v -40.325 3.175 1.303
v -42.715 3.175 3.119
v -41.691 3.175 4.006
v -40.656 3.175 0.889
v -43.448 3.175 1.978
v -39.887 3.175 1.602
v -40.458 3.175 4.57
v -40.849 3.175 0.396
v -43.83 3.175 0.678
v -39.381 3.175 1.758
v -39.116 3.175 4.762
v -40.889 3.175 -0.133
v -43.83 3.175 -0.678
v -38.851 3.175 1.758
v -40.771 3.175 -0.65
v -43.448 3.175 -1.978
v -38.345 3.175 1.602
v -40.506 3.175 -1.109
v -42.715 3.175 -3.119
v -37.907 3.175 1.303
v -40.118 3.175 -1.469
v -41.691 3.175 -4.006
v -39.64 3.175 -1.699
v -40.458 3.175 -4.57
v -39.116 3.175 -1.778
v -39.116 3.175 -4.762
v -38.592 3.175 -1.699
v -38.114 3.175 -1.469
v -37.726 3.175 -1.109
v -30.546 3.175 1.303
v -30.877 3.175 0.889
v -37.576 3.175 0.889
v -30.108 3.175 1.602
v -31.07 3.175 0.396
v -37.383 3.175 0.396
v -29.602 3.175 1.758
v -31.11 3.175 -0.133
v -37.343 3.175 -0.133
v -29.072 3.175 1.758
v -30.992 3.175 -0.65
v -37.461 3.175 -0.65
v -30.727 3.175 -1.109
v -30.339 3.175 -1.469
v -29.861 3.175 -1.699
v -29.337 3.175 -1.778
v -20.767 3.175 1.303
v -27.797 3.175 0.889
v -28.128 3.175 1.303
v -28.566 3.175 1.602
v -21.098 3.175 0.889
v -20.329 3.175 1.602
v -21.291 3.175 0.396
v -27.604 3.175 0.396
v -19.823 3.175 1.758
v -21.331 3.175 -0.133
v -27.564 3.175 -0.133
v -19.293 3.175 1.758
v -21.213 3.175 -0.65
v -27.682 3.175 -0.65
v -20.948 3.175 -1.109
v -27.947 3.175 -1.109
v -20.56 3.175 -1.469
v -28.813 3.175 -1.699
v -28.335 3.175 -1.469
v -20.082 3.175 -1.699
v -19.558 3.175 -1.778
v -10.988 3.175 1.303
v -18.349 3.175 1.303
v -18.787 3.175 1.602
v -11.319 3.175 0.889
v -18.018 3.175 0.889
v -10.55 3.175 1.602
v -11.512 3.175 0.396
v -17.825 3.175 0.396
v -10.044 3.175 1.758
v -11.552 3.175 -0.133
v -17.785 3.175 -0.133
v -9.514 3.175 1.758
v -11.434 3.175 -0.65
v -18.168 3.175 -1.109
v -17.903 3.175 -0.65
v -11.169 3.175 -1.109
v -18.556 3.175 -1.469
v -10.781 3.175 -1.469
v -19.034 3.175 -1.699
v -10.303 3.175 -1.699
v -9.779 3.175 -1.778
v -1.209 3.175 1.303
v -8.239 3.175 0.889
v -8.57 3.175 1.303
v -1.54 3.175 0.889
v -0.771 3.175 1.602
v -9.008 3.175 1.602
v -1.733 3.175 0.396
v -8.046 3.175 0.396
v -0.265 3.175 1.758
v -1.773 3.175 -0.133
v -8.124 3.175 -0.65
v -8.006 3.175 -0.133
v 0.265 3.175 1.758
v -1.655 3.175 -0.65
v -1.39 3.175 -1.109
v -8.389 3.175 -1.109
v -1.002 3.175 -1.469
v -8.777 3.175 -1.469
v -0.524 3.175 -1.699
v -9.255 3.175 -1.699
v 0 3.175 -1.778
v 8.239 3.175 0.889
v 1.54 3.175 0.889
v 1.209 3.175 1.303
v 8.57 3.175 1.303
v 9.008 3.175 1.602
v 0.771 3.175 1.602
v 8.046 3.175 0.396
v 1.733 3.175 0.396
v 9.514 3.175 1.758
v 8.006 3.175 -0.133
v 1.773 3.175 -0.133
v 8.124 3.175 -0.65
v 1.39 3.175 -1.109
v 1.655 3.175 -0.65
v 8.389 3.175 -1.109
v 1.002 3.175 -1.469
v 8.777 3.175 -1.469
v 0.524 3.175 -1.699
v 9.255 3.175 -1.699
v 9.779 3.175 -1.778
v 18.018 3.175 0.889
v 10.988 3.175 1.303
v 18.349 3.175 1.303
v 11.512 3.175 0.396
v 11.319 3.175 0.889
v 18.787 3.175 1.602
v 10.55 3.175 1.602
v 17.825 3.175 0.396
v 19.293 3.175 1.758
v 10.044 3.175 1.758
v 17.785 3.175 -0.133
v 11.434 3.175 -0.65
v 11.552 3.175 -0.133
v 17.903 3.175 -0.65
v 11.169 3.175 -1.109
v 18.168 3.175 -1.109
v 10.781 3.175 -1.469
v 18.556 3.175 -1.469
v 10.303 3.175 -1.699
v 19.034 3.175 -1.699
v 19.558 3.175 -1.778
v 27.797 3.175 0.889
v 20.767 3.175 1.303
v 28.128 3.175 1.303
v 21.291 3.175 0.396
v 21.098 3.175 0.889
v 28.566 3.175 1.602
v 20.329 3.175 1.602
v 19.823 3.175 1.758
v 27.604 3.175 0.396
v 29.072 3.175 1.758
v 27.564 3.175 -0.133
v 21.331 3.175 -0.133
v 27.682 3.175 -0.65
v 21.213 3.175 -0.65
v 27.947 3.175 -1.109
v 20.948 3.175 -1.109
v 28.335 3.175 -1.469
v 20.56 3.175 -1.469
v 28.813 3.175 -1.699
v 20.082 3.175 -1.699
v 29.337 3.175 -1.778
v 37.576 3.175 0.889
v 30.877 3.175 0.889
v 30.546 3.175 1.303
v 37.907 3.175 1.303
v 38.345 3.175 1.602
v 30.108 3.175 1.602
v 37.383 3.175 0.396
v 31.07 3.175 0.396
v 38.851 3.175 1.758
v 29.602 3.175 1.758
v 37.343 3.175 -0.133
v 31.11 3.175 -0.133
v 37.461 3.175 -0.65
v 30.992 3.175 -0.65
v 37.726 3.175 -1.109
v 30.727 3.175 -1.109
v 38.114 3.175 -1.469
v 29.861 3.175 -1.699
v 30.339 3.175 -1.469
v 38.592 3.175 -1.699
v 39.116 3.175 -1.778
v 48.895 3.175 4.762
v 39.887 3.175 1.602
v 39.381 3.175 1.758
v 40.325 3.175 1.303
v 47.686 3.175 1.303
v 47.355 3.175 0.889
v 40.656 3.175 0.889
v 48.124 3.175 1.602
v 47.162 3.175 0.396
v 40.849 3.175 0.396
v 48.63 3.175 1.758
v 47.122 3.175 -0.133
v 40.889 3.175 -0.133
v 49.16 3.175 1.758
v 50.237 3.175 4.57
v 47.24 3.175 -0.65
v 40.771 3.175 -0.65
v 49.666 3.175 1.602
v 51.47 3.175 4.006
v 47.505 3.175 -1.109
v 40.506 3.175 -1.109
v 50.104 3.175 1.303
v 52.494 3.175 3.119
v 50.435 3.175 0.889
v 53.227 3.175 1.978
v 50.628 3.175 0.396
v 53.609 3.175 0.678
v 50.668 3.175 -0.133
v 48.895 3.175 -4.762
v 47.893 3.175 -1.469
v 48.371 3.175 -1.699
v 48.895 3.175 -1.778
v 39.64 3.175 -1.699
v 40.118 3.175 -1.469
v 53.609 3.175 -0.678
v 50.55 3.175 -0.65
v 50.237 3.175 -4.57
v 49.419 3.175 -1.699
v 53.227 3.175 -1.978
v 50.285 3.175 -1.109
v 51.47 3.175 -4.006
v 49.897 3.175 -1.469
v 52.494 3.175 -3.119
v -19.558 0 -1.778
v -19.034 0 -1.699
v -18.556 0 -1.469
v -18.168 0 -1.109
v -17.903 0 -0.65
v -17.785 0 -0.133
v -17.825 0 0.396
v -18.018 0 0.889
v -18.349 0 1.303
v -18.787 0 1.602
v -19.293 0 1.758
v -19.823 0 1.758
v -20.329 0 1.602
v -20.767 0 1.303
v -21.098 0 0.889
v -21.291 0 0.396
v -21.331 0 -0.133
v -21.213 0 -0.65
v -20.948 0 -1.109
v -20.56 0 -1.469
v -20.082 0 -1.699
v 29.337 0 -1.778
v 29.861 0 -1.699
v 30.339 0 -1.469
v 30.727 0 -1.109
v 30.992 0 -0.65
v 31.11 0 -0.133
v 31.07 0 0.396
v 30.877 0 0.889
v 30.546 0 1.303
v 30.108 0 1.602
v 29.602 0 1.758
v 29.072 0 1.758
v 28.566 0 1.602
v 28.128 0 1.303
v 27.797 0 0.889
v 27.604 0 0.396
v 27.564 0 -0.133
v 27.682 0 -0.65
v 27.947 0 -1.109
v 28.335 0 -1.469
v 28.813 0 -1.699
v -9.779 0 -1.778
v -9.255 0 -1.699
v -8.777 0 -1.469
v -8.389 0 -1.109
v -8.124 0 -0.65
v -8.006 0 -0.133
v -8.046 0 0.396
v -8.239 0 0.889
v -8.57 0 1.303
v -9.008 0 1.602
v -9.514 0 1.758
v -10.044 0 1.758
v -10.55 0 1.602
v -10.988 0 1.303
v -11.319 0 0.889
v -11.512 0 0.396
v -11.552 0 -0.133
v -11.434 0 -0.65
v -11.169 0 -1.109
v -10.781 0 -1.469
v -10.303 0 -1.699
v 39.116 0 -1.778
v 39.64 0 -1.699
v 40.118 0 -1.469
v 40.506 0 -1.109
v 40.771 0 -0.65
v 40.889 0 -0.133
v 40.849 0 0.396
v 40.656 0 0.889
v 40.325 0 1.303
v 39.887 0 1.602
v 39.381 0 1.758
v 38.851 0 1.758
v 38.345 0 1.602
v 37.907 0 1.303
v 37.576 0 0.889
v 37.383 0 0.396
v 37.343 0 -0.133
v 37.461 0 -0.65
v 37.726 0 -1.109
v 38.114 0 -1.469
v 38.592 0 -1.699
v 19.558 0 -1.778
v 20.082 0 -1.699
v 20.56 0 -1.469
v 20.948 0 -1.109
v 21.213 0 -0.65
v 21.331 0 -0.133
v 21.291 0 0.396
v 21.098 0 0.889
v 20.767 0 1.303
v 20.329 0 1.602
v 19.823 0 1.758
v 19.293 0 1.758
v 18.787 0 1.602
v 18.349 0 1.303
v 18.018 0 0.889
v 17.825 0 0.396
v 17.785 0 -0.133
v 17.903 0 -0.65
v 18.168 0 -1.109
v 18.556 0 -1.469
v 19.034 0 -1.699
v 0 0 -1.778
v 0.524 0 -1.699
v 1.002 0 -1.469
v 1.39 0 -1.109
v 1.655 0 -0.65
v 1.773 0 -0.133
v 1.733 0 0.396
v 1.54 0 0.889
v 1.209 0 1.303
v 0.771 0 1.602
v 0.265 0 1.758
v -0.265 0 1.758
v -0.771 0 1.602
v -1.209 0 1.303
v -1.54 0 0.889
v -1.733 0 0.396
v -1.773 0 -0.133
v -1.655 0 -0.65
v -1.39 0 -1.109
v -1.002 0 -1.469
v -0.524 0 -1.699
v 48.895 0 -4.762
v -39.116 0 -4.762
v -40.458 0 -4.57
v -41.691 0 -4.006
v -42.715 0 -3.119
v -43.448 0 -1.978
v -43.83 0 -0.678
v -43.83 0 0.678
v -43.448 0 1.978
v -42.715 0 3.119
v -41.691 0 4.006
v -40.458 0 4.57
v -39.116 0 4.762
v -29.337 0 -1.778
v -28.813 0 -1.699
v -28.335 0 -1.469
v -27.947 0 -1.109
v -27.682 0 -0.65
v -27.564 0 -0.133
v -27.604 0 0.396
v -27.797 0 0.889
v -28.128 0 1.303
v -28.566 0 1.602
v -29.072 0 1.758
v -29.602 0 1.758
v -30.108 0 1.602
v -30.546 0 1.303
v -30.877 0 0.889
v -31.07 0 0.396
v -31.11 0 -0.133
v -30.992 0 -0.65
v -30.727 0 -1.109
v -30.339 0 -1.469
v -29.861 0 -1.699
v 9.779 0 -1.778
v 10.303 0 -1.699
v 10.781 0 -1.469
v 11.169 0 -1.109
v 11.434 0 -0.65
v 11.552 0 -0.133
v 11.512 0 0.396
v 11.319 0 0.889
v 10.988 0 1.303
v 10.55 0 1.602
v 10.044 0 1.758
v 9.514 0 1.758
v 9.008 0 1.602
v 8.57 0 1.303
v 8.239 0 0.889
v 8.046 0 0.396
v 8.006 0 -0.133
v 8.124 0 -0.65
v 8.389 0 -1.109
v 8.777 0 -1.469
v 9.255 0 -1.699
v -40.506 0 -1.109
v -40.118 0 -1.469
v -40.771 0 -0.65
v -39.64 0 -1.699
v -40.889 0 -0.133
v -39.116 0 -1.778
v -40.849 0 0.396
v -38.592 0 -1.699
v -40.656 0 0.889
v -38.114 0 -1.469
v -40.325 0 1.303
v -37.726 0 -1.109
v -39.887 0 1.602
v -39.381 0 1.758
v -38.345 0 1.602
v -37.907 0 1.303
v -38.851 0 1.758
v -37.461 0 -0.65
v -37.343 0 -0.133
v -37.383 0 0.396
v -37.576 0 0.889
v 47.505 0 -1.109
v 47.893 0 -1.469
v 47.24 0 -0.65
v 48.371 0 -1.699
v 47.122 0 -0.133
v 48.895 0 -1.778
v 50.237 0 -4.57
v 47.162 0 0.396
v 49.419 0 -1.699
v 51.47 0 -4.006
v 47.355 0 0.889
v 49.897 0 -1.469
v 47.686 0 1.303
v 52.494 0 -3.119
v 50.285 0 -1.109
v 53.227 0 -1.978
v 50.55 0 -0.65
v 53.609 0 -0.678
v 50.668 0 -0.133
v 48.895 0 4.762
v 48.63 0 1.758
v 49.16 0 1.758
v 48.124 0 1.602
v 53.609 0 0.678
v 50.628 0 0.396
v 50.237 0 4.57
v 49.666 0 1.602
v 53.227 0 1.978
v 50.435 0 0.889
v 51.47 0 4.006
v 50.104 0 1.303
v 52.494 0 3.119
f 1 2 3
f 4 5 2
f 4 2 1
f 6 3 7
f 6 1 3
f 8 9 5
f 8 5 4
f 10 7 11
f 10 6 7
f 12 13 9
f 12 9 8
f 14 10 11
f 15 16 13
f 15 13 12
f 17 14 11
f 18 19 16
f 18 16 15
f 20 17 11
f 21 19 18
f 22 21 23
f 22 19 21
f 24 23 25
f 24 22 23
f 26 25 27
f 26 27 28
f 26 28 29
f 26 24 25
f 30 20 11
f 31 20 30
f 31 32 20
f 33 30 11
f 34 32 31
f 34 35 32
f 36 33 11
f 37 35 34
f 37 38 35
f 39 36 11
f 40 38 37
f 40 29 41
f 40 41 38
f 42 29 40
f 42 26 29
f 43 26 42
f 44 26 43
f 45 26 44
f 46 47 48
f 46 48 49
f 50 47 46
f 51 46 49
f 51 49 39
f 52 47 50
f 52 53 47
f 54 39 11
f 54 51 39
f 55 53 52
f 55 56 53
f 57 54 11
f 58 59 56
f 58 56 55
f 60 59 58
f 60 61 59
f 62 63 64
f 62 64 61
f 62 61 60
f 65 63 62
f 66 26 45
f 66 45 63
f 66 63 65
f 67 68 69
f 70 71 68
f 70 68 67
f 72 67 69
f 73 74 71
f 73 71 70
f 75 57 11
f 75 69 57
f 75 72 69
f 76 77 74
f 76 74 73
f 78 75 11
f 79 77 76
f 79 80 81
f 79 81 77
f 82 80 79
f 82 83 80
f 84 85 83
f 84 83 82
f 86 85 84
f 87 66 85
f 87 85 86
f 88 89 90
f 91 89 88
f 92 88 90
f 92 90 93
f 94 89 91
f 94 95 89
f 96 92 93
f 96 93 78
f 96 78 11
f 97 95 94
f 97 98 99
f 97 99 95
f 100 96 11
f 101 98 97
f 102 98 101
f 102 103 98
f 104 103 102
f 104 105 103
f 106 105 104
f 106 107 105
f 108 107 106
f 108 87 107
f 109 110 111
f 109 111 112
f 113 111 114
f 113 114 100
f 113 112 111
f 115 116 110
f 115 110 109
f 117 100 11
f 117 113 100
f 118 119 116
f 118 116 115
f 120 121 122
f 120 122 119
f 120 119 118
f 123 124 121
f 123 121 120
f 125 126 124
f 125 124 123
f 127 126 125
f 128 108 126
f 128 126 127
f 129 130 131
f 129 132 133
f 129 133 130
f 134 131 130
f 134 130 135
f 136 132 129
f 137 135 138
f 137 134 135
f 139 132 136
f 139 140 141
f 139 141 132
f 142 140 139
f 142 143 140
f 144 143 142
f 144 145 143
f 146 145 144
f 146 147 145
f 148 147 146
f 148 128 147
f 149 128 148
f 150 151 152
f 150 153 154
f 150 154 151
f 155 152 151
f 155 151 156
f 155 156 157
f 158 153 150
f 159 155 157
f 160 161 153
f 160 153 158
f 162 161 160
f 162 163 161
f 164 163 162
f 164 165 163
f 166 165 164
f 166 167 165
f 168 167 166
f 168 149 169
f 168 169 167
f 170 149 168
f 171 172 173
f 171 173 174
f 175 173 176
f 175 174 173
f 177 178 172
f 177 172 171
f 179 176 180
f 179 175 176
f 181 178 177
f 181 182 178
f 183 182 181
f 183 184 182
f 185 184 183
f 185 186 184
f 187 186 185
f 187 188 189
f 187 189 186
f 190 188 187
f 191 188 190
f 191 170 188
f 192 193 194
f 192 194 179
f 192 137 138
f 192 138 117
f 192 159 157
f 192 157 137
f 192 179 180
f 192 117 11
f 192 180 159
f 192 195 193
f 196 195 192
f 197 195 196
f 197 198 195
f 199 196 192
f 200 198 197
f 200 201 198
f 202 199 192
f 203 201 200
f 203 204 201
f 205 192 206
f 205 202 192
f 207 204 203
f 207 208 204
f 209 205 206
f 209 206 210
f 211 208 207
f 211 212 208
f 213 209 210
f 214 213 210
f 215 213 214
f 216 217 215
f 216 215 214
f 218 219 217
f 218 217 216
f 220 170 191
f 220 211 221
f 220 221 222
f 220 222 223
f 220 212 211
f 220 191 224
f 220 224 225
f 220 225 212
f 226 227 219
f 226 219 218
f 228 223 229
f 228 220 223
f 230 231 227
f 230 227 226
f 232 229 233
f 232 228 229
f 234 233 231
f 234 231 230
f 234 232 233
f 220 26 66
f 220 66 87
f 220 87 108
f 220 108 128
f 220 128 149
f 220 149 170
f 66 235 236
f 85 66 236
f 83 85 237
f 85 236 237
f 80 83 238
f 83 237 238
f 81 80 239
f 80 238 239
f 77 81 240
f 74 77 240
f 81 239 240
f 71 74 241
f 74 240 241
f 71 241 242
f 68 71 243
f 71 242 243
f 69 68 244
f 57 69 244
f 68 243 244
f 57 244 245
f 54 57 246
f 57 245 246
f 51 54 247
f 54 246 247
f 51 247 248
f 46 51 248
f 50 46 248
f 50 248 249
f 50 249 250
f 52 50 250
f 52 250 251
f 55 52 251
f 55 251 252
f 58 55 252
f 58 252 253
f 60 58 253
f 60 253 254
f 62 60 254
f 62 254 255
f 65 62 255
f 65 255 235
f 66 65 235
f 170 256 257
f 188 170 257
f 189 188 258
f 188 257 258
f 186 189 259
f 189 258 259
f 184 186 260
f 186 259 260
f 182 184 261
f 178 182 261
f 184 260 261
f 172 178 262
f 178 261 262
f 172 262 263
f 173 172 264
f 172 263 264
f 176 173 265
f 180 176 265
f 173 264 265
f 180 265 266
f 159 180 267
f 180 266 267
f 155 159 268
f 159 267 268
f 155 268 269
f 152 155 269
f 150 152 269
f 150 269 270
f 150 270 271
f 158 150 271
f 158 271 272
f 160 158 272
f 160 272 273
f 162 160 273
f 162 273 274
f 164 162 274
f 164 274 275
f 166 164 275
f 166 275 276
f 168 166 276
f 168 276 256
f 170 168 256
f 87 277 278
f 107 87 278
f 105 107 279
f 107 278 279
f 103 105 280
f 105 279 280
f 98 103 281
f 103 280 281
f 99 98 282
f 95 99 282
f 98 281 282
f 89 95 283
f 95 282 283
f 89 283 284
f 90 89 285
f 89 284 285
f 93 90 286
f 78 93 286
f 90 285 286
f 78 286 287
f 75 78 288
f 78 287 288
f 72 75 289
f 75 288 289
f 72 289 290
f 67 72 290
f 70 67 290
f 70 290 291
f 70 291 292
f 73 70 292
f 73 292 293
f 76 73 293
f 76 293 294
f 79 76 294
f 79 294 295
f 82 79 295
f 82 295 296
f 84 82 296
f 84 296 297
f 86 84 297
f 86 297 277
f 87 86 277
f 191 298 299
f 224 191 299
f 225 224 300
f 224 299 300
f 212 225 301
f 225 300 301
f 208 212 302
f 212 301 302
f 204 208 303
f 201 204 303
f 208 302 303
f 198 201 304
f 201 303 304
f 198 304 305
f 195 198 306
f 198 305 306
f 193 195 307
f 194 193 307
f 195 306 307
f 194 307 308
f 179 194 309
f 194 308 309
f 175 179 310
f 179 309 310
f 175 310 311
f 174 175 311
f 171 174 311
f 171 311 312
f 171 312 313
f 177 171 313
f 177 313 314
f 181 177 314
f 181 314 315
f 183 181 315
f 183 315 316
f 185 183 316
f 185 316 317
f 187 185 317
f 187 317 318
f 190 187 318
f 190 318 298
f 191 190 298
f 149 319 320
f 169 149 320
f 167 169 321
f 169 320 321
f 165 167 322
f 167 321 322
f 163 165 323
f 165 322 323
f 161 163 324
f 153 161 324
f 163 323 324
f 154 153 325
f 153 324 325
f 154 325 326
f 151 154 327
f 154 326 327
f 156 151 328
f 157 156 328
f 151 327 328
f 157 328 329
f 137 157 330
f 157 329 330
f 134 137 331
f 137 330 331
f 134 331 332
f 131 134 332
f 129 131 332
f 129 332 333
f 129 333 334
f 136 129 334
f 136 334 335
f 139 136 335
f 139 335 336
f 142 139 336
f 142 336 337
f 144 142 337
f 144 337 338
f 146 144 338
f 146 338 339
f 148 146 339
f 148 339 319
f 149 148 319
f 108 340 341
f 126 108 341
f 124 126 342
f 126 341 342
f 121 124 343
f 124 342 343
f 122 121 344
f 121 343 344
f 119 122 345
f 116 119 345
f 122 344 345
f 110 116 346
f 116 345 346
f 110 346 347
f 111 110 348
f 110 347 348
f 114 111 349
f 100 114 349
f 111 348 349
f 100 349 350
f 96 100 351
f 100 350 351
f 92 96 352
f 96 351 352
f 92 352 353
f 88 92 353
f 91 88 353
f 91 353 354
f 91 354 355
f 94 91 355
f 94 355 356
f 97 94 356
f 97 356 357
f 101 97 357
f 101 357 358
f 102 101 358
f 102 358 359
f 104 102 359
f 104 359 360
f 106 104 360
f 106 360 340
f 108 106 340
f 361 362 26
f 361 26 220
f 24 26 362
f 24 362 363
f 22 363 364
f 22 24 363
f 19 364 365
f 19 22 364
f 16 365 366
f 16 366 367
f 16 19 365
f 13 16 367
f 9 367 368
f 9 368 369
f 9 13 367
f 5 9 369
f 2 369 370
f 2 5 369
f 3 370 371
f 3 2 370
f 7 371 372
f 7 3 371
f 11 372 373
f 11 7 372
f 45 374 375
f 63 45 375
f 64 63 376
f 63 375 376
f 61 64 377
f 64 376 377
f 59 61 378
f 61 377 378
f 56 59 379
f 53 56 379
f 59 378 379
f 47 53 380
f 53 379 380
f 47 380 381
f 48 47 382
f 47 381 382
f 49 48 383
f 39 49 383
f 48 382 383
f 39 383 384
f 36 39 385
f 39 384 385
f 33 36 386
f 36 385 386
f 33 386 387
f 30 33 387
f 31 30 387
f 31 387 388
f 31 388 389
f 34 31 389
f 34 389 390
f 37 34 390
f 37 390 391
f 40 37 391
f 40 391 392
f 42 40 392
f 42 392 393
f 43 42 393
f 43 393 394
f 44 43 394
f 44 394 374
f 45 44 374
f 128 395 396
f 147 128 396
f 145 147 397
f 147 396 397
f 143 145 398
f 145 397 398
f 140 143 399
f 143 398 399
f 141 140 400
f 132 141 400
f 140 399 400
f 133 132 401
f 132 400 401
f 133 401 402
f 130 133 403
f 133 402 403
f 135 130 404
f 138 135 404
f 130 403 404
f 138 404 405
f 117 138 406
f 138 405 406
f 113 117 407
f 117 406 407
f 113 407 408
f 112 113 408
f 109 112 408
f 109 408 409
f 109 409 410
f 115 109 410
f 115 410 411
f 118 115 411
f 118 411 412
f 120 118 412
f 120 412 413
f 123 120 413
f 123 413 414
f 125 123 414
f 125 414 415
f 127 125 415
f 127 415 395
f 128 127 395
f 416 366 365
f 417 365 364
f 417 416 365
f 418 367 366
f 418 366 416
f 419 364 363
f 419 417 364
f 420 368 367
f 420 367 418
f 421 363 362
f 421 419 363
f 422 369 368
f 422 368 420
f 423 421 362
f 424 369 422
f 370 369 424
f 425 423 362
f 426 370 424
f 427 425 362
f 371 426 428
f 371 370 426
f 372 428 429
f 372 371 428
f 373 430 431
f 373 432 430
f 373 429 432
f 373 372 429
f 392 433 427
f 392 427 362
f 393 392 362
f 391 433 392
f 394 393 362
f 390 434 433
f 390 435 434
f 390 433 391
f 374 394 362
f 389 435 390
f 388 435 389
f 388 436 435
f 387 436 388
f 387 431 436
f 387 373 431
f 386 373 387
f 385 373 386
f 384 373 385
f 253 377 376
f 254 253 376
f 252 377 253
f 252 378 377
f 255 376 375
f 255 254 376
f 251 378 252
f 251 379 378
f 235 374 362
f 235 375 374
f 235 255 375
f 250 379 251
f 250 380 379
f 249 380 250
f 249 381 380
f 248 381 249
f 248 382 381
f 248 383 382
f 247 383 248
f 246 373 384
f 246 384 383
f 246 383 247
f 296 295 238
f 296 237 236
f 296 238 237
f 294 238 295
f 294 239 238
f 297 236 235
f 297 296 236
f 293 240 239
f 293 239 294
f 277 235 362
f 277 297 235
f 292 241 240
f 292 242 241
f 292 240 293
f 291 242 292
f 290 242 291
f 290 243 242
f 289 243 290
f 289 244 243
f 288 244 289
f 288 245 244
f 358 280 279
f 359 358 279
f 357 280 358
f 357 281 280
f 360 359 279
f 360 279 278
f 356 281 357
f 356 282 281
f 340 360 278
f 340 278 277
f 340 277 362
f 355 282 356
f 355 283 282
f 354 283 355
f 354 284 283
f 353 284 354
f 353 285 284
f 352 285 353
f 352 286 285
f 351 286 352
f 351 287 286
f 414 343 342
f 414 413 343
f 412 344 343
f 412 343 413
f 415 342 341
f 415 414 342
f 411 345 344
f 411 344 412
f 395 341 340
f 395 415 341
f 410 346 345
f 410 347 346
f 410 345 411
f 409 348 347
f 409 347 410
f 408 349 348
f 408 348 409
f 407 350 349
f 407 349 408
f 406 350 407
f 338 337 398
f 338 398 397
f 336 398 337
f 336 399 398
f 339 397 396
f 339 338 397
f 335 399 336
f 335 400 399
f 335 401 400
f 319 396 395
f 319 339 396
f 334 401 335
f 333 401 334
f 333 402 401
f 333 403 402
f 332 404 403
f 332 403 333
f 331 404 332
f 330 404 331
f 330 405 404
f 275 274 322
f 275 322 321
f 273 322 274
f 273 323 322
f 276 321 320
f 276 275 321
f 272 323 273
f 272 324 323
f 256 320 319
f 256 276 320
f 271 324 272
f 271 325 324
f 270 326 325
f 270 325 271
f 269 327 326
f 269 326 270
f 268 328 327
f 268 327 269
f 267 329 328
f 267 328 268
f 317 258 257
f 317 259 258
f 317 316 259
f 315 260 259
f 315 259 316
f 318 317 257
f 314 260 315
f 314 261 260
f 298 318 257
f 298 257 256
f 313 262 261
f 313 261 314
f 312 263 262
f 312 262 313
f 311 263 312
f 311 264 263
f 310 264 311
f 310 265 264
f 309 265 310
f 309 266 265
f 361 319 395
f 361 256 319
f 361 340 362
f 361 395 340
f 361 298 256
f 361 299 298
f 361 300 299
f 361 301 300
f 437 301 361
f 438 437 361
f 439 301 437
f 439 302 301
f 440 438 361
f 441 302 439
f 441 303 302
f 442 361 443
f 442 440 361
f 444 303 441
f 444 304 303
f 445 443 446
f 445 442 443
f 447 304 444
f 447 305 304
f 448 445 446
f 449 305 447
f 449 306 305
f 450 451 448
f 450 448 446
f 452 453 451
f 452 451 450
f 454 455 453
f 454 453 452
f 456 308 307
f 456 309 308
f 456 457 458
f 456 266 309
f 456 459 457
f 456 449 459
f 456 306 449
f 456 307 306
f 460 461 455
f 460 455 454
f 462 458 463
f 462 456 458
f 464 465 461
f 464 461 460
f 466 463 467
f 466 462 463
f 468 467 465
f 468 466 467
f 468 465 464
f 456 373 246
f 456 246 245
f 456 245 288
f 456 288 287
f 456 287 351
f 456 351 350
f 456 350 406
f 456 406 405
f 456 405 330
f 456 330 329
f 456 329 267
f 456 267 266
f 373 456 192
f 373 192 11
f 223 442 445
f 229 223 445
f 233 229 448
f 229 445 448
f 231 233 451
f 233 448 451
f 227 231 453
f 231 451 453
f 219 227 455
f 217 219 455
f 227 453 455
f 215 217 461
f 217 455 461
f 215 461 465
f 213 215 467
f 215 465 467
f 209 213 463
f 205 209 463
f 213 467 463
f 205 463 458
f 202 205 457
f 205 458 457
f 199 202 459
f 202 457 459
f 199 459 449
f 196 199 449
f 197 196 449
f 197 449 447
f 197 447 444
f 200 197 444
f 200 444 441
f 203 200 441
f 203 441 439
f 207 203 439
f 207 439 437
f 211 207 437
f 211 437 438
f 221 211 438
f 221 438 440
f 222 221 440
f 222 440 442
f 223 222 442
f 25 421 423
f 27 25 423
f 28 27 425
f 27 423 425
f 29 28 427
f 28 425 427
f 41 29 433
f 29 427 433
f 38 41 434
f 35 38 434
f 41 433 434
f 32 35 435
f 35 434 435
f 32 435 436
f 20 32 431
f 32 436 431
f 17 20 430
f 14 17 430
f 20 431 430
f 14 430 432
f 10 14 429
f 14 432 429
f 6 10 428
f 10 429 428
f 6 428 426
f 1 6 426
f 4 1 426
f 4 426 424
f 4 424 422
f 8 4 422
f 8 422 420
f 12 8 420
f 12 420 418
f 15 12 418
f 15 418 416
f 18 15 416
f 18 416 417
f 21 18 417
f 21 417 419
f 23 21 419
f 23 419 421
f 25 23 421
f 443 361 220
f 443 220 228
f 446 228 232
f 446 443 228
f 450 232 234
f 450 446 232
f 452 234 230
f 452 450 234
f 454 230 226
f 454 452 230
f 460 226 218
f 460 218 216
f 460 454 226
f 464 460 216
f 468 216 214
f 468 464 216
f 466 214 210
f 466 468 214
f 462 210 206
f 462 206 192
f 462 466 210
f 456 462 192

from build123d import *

# Parameters (mm, degrees)
SKETCH1_R           = 1.778
BOSS_EXTRUDE1_DEPTH = 6.35
CUT_EXTRUDE1_DEPTH  = 55.241416026
SKETCH3_W           = 123.961526382
SKETCH3_H           = 57.130094768
CUT_EXTRUDE2_DEPTH  = 3.175


with BuildPart() as part:
    # Sketch1 → Boss-Extrude1 (new body)
    with BuildSketch(Plane.XZ):
        with BuildLine():
            Line((-48.895, -4.7625), (48.895, -4.7625))
            ThreePointArc((48.895, -4.7625), (53.6575, 0), (48.895, 4.7625))
            Line((48.895, 4.7625), (-48.895, 4.7625))
            ThreePointArc((-48.895, 4.7625), (-53.6575, 0), (-48.895, -4.7625))
        make_face()
        with Locations(Location((48.895, 0, 0), (0, 0, 270))):
            Circle(SKETCH1_R, mode=Mode.SUBTRACT)
        with Locations(Location((39.116, 0, 0), (0, 0, 270))):
            Circle(SKETCH1_R, mode=Mode.SUBTRACT)
        with Locations(Location((29.337, 0, 0), (0, 0, 270))):
            Circle(SKETCH1_R, mode=Mode.SUBTRACT)
        with Locations(Location((19.558, 0, 0), (0, 0, 270))):
            Circle(SKETCH1_R, mode=Mode.SUBTRACT)
        with Locations(Location((9.779, 0, 0), (0, 0, 270))):
            Circle(SKETCH1_R, mode=Mode.SUBTRACT)
        with Locations(Location((0, 0, 0), (0, 0, 270))):
            Circle(SKETCH1_R, mode=Mode.SUBTRACT)
        with Locations(Location((-9.779, 0, 0), (0, 0, 270))):
            Circle(SKETCH1_R, mode=Mode.SUBTRACT)
        with Locations(Location((-19.558, 0, 0), (0, 0, 270))):
            Circle(SKETCH1_R, mode=Mode.SUBTRACT)
        with Locations(Location((-29.337, 0, 0), (0, 0, 270))):
            Circle(SKETCH1_R, mode=Mode.SUBTRACT)
        with Locations(Location((-39.116, 0, 0), (0, 0, 270))):
            Circle(SKETCH1_R, mode=Mode.SUBTRACT)
        with Locations(Location((-48.895, 0, 0), (0, 0, 270))):
            Circle(SKETCH1_R, mode=Mode.SUBTRACT)
    extrude(amount=-BOSS_EXTRUDE1_DEPTH)

    # Sketch2 → Cut-Extrude1 (cut, through all)
    with BuildSketch(Plane(origin=(0, 6.35, 0), x_dir=(1, 0, 0), z_dir=(0, 1, 0))):
        with BuildLine():
            Line((-39.116, -4.7625), (-55.615088879, -6.941351058))
            Line((-55.615088879, -6.941351058), (-55.615088879, 8.998214698))
            Line((-55.615088879, 8.998214698), (-39.116, 4.7625))
            ThreePointArc((-39.116, 4.7625), (-43.8785, 0), (-39.116, -4.7625))
        make_face()
    extrude(amount=-CUT_EXTRUDE1_DEPTH, mode=Mode.SUBTRACT)

    # Sketch3 → Cut-Extrude2 (cut)
    with BuildSketch(Plane(origin=(0, 6.35, 0), x_dir=(1, 0, 0), z_dir=(0, 1, 0))):
        with Locations((1.520980261, -5.389631582)):
            Rectangle(SKETCH3_W, SKETCH3_H)
    extrude(amount=-CUT_EXTRUDE2_DEPTH, mode=Mode.SUBTRACT)


solid = part.part
